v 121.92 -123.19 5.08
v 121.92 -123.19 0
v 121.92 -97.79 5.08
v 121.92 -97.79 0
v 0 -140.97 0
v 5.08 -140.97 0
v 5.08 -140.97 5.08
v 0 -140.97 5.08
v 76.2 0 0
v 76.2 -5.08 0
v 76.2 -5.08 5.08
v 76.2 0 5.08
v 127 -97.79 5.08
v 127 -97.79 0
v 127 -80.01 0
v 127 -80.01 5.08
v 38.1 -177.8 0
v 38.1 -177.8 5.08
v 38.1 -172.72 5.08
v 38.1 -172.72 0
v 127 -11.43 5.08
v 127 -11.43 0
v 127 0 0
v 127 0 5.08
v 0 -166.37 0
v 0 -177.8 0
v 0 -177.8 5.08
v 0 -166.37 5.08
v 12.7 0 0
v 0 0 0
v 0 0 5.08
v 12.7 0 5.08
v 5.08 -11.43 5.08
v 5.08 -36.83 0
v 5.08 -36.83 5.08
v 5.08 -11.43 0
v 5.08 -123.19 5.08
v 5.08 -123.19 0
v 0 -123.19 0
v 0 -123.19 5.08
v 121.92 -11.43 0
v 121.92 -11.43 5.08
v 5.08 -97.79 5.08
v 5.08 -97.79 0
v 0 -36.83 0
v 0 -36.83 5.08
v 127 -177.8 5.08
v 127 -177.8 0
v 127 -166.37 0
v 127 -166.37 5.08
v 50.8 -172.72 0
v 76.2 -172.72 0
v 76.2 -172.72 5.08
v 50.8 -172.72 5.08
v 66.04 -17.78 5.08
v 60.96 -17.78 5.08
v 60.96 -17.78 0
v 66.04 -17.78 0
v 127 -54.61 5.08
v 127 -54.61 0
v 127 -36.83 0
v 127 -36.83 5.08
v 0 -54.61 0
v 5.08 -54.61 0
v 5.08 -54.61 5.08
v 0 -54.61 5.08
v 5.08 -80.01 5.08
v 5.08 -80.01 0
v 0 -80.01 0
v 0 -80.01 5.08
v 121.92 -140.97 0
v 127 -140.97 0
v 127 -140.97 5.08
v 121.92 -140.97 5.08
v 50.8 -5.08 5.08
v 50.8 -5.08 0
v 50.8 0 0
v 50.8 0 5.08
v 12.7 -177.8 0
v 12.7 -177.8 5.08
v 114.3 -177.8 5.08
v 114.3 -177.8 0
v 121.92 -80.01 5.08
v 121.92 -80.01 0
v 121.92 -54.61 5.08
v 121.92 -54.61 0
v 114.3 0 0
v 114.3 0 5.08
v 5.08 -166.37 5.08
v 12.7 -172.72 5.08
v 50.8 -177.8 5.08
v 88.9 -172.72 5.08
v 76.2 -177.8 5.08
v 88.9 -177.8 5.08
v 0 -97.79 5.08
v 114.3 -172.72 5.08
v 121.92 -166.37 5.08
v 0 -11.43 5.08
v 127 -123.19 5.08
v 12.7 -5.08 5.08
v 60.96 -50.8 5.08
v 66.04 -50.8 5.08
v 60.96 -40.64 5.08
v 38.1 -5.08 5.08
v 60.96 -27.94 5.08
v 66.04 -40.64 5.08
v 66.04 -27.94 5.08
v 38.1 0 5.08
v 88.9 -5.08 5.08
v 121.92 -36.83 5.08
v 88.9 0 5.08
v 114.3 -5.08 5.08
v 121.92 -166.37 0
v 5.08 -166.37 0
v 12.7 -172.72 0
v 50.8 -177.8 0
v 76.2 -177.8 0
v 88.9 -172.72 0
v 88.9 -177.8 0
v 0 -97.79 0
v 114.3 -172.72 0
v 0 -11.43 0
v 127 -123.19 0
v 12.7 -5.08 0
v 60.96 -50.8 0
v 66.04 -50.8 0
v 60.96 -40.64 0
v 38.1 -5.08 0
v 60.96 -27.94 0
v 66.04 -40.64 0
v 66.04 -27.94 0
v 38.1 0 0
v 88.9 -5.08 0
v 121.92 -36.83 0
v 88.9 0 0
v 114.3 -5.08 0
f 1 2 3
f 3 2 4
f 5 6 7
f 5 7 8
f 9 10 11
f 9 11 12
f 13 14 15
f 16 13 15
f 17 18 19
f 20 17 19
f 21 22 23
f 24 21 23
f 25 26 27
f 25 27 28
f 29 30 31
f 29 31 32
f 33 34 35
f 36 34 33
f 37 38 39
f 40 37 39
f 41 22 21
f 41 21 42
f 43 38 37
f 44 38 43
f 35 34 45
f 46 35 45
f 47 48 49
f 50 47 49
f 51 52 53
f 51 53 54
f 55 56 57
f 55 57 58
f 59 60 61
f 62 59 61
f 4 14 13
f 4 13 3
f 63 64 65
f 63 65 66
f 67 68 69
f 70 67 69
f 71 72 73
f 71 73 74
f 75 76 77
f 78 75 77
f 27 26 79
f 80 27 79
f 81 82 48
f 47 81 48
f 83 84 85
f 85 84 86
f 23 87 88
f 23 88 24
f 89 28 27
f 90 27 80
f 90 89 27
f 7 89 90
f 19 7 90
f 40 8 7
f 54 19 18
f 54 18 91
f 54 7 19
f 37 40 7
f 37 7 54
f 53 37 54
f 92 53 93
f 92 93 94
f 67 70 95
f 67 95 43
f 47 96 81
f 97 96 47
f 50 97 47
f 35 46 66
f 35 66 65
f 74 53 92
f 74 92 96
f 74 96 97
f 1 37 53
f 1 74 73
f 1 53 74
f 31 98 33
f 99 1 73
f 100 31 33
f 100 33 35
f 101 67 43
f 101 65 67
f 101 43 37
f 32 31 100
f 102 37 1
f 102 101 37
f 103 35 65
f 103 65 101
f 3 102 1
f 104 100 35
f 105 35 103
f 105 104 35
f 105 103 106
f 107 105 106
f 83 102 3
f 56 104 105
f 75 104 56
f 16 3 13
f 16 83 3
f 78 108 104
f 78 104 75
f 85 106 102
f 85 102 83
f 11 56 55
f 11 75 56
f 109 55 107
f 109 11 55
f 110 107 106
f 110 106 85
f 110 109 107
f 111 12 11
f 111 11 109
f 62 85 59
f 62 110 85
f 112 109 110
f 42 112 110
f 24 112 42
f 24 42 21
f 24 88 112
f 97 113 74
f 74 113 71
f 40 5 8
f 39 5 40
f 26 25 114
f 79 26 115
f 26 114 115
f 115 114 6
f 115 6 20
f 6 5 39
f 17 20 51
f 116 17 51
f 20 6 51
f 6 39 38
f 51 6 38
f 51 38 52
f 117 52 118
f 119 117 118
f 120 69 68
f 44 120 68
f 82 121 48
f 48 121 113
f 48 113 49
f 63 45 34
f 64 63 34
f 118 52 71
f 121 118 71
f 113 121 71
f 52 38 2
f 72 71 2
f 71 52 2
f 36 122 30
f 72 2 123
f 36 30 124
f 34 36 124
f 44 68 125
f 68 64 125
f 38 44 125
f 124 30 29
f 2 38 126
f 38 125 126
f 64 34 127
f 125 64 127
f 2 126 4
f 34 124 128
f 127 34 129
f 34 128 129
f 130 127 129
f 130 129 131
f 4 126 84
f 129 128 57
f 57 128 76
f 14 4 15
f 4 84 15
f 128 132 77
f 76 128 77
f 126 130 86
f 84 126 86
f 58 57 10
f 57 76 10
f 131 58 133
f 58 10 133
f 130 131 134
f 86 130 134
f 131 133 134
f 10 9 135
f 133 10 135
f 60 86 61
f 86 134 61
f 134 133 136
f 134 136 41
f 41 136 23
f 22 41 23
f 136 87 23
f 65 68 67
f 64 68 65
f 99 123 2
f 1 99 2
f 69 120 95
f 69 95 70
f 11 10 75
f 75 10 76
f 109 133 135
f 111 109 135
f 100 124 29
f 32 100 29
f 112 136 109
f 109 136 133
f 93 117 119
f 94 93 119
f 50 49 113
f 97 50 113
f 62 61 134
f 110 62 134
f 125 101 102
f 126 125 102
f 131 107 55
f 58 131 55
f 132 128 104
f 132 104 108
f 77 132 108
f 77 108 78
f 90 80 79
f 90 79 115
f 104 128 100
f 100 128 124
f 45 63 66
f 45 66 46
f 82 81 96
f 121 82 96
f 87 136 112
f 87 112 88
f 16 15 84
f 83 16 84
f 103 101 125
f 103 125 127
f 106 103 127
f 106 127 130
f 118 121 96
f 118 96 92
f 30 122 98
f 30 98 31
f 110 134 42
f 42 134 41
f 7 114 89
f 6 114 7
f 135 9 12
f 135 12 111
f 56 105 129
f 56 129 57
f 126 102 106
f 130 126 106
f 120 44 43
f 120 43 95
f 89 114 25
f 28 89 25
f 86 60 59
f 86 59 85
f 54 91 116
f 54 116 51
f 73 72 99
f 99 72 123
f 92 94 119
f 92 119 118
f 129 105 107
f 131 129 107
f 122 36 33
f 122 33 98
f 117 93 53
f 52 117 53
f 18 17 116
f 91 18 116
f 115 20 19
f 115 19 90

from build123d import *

# Parameters (mm, degrees)
SKETCH2_W           = 127
SKETCH2_H           = 177.8
BOSS_EXTRUDE2_DEPTH = 5.08
SKETCH3_W           = 5.08
SKETCH3_H           = 25.4
CUT_EXTRUDE1_DEPTH  = 5.08
LPATTERN1_COUNT     = 5
LPATTERN1_PITCH     = 43.18
SKETCH4_W           = 5.08
SKETCH4_H           = 25.4
CUT_EXTRUDE2_DEPTH  = 5.08
LPATTERN2_COUNT     = 4
LPATTERN2_PITCH     = 43.18
SKETCH5_W           = 25.4
SKETCH5_H           = 5.08
CUT_EXTRUDE3_DEPTH  = 5.08
LPATTERN3_COUNT     = 3
LPATTERN3_PITCH     = 38.1
SKETCH6_W           = 25.4
SKETCH6_H           = 5.08
CUT_EXTRUDE4_DEPTH  = 5.08
LPATTERN4_COUNT     = 3
LPATTERN4_PITCH     = 38.1
SKETCH7_W           = 5.08
SKETCH7_H           = 10.16
CUT_EXTRUDE5_DEPTH  = 5.08


with BuildPart() as part:
    # Sketch2 → Boss-Extrude2 (new body)
    with BuildSketch(Plane.XY):
        with Locations((63.5, -88.9)):
            Rectangle(SKETCH2_W, SKETCH2_H)
    extrude(amount=BOSS_EXTRUDE2_DEPTH)

    # Sketch3 → Cut-Extrude1 (cut)
    with BuildSketch(Plane(origin=(0, 0, 0), x_dir=(-1, 0, 0), z_dir=(0, 0, -1))):
        with Locations((-124.46, -153.67)):
            Rectangle(SKETCH3_W, SKETCH3_H)
    cut_extrude1 = extrude(amount=-CUT_EXTRUDE1_DEPTH, mode=Mode.SUBTRACT)

    # LPattern1: Cut-Extrude1 ×5
    with Locations(*[(0, i * LPATTERN1_PITCH, 0) for i in range(1, LPATTERN1_COUNT)]):
        add(cut_extrude1, mode=Mode.SUBTRACT)

    # Sketch4 → Cut-Extrude2 (cut)
    with BuildSketch(Plane(origin=(0, 0, 0), x_dir=(-1, 0, 0), z_dir=(0, 0, -1))):
        with Locations((-2.54, -153.67)):
            Rectangle(SKETCH4_W, SKETCH4_H)
    cut_extrude2 = extrude(amount=-CUT_EXTRUDE2_DEPTH, mode=Mode.SUBTRACT)

    # LPattern2: Cut-Extrude2 ×4
    with Locations(*[(0, i * LPATTERN2_PITCH, 0) for i in range(1, LPATTERN2_COUNT)]):
        add(cut_extrude2, mode=Mode.SUBTRACT)

    # Sketch5 → Cut-Extrude3 (cut)
    with BuildSketch(Plane(origin=(0, 0, 0), x_dir=(-1, 0, 0), z_dir=(0, 0, -1))):
        with Locations((-101.6, -175.26)):
            Rectangle(SKETCH5_W, SKETCH5_H)
    cut_extrude3 = extrude(amount=-CUT_EXTRUDE3_DEPTH, mode=Mode.SUBTRACT)

    # LPattern3: Cut-Extrude3 ×3
    with Locations(*[(-i * LPATTERN3_PITCH, 0, 0) for i in range(1, LPATTERN3_COUNT)]):
        add(cut_extrude3, mode=Mode.SUBTRACT)

    # Sketch6 → Cut-Extrude4 (cut)
    with BuildSketch(Plane(origin=(0, 0, 0), x_dir=(-1, 0, 0), z_dir=(0, 0, -1))):
        with Locations((-25.4, -2.54)):
            Rectangle(SKETCH6_W, SKETCH6_H)
    cut_extrude4 = extrude(amount=-CUT_EXTRUDE4_DEPTH, mode=Mode.SUBTRACT)

    # LPattern4: Cut-Extrude4 ×3
    with Locations(*[(i * LPATTERN4_PITCH, 0, 0) for i in range(1, LPATTERN4_COUNT)]):
        add(cut_extrude4, mode=Mode.SUBTRACT)

    # Sketch7 → Cut-Extrude5 (cut)
    with BuildSketch(Plane.XY.offset(5.08)):
        with Locations((63.5, -22.86)):
            Rectangle(SKETCH7_W, SKETCH7_H)
        with Locations((63.5, -45.72)):
            Rectangle(SKETCH7_W, SKETCH7_H)
    extrude(amount=-CUT_EXTRUDE5_DEPTH, mode=Mode.SUBTRACT)


solid = part.part
